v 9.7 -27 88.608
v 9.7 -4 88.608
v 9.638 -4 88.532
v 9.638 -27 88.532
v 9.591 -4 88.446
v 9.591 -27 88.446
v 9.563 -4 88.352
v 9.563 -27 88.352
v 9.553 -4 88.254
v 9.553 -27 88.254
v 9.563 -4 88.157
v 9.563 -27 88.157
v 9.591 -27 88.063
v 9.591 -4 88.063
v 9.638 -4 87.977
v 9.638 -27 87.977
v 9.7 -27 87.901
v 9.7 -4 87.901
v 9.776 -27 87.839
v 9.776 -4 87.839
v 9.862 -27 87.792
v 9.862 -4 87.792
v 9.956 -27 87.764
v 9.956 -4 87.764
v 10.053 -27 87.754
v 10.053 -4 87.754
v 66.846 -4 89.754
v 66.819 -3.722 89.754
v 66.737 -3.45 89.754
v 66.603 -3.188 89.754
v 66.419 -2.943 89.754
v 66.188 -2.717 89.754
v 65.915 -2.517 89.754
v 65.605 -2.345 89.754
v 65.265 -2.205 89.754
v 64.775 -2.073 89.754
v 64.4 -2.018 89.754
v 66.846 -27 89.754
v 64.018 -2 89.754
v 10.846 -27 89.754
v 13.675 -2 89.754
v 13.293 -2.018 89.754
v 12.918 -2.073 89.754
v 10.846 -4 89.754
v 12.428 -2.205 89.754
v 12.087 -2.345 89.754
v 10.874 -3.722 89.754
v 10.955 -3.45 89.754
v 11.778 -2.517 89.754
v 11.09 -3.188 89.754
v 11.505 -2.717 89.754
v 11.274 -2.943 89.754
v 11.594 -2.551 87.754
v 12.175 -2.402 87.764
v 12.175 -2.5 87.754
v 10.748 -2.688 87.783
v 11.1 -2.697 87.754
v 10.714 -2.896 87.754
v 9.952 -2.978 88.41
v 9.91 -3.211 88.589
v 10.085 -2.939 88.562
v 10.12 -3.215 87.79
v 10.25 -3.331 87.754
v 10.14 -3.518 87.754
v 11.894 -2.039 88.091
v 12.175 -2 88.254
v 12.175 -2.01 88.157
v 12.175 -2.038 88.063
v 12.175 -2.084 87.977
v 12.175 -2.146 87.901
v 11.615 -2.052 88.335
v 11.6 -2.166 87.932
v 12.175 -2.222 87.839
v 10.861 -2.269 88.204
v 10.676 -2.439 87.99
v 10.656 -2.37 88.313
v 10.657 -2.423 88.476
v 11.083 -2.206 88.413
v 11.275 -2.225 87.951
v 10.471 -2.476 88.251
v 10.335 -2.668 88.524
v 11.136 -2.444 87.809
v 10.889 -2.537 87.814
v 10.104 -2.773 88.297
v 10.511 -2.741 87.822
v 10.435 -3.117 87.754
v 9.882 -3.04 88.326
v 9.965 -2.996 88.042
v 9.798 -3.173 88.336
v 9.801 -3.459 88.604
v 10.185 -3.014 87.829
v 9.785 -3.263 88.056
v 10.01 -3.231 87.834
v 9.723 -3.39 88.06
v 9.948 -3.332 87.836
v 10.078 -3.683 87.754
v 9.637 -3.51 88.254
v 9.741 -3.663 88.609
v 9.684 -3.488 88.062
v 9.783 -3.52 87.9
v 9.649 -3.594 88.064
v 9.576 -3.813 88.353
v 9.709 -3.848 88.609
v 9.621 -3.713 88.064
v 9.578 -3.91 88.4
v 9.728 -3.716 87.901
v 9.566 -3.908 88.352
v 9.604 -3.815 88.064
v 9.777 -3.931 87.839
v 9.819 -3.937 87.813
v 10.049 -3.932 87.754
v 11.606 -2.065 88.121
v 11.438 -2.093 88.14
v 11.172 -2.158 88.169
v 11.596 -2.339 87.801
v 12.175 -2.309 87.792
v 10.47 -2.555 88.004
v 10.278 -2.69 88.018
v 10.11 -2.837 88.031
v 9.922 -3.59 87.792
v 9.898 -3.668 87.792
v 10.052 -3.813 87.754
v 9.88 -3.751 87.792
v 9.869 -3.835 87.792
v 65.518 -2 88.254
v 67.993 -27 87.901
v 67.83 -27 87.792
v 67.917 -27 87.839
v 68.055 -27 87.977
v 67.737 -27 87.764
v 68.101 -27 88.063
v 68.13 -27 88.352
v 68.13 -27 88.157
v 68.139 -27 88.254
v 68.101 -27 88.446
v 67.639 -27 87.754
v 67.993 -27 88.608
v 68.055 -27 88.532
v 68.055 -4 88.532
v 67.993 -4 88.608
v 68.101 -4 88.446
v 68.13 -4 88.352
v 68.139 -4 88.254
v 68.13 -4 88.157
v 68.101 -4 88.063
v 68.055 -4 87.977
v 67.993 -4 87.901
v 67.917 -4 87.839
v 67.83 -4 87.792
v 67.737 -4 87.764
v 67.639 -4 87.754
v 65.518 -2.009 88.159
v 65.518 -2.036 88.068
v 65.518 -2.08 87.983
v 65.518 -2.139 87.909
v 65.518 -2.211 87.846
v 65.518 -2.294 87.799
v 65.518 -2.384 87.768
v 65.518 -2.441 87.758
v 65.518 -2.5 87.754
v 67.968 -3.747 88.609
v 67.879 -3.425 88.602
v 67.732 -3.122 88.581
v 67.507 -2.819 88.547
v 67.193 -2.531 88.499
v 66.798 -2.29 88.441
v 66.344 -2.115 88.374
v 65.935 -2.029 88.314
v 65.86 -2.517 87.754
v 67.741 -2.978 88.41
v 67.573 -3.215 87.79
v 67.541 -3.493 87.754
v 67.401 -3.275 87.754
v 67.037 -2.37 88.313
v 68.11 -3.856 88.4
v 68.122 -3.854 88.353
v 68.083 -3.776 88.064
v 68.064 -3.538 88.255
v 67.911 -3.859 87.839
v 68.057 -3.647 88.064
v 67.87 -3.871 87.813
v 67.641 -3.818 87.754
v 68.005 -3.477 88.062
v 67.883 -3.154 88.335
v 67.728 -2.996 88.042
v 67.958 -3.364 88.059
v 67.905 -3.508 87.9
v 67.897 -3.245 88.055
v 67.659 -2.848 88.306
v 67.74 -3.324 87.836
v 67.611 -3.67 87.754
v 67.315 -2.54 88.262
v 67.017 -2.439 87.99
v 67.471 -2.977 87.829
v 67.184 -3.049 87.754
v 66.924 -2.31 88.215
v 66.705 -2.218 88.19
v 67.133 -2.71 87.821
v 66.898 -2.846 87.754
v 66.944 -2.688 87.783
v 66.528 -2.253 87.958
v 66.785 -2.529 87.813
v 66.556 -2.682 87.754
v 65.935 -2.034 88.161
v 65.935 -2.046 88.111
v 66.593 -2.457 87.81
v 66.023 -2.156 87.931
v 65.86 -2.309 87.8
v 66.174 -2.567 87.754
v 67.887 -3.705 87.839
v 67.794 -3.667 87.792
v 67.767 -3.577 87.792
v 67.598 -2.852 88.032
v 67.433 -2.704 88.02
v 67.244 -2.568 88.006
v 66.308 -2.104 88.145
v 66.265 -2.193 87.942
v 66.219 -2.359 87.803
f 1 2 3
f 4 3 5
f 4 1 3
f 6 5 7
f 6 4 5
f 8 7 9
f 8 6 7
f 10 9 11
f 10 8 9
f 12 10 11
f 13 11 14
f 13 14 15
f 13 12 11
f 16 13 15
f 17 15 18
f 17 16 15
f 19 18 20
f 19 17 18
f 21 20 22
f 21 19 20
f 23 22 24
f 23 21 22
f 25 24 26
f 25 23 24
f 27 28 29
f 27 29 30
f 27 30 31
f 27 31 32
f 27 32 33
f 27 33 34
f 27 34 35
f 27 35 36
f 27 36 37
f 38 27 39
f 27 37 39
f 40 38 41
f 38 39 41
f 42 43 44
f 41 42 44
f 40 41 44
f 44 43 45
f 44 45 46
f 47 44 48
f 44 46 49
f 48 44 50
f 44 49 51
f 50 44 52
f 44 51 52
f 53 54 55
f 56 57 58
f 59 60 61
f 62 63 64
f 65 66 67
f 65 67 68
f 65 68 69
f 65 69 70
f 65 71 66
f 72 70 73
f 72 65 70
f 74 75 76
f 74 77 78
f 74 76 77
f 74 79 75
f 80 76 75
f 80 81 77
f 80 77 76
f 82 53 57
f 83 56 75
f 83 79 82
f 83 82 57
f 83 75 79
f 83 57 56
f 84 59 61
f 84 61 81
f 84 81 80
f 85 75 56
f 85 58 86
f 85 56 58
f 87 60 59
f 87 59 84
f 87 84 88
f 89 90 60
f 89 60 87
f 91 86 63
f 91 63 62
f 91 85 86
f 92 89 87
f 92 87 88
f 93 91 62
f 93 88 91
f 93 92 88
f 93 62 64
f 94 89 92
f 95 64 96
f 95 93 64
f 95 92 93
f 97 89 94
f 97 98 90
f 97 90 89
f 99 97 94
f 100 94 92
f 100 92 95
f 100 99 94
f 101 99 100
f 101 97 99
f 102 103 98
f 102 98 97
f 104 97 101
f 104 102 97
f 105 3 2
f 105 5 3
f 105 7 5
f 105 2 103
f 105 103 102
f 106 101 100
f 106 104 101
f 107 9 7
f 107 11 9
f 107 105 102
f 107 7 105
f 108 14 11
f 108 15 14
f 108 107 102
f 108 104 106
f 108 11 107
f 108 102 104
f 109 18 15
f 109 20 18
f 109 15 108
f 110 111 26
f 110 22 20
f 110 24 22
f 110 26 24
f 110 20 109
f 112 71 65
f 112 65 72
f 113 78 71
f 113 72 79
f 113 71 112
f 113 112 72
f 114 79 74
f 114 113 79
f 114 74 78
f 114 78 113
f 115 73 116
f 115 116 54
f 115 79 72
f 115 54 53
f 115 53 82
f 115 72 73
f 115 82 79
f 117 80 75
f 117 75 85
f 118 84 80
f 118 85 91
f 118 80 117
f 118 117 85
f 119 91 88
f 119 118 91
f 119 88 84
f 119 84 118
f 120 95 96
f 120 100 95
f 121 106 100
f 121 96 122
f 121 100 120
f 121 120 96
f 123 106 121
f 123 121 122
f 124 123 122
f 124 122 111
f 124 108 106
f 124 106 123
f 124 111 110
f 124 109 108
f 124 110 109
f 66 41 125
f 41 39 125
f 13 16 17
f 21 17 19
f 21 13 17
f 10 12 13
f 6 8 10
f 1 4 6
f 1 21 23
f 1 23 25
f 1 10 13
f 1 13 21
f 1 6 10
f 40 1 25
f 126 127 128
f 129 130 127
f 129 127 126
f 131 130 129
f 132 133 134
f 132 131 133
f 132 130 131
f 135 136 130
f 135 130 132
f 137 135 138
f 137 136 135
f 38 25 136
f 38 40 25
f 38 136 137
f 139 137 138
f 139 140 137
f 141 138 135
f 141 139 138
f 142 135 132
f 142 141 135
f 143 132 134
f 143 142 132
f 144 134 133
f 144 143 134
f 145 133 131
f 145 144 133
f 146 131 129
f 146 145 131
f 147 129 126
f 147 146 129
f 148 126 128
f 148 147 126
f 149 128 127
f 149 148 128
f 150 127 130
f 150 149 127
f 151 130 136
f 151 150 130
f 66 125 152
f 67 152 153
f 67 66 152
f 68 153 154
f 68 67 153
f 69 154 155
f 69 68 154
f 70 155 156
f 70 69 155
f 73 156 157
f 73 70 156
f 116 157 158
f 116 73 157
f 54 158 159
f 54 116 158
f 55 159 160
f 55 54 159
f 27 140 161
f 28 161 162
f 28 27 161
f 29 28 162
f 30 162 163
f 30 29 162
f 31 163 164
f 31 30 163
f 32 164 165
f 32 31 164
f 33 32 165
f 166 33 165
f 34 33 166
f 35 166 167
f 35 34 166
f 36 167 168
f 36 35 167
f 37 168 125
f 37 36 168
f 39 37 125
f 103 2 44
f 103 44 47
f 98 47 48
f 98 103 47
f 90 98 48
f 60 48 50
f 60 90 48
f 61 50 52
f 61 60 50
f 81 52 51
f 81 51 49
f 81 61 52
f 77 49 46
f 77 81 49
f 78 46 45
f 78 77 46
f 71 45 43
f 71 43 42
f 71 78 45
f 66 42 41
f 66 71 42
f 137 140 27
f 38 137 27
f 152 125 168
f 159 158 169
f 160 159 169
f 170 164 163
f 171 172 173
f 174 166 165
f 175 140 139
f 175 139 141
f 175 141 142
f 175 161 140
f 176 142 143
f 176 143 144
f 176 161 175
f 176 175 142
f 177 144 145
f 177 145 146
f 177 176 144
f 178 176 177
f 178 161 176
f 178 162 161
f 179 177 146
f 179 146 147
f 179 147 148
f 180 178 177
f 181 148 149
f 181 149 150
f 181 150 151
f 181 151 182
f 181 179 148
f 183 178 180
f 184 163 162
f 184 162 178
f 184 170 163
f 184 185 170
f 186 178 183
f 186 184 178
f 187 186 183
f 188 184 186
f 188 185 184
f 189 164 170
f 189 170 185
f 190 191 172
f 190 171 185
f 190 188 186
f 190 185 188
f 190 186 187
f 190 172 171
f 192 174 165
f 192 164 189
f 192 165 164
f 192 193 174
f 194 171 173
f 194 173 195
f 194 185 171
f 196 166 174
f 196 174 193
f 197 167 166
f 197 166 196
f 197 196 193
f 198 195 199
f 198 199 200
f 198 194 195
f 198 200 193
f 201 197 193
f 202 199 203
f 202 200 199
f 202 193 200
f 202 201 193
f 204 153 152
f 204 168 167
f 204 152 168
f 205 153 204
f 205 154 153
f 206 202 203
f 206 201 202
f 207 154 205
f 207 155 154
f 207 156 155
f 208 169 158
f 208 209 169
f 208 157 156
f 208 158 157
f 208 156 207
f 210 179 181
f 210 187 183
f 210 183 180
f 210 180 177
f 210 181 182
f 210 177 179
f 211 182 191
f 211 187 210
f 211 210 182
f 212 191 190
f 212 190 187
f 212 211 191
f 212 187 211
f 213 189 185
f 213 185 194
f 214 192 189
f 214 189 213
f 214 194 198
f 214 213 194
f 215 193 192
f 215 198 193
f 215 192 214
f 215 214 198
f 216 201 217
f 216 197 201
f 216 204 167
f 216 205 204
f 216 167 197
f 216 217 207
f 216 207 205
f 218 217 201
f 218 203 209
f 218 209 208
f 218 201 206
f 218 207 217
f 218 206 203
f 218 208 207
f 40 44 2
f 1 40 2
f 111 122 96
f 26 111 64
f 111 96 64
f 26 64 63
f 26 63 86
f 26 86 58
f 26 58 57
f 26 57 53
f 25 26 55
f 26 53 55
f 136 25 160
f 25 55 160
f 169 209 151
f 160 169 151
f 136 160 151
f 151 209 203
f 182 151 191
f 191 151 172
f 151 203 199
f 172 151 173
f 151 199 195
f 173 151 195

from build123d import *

# Parameters (mm, degrees)
EXTRUDE_DEPTH = 25
FILLET016_R   = 2
FILLET017_R   = 0.5


with BuildPart() as part:
    # Sketch → Extrude (new body)
    with BuildSketch(Plane.XZ):
        Polygon((10.846248, 101.514289), (8.846248, 99.514289), (68.846248, 99.514289), (66.846248, 101.514289), align=None)
    extrude(amount=EXTRUDE_DEPTH)


with BuildPart() as part_1:
    # Extrude placement: moved
    add(part.part.moved(Location((0.5, -6.5, -11.5))))

    # Fillet016
    fillet016_edges = [part_1.edges().sort_by_distance(p)[0] for p in [
        (10.346248, -6.5, 89.014289),
        (68.346248, -6.5, 89.014289),
    ]]
    fillet(fillet016_edges, radius=FILLET016_R)

    # Fillet017
    fillet017_edges = [part_1.edges().sort_by_distance(p)[0] for p in [
        (9.346248, -20, 88.014289),
        (69.346248, -20, 88.014289),
    ]]
    fillet(fillet017_edges, radius=FILLET017_R)


with BuildPart() as part_2:
    # Fillet017 placement: moved
    add(part_1.part.moved(Location((-0.5, 4.5, -0.26))))


solid = part_2.part
